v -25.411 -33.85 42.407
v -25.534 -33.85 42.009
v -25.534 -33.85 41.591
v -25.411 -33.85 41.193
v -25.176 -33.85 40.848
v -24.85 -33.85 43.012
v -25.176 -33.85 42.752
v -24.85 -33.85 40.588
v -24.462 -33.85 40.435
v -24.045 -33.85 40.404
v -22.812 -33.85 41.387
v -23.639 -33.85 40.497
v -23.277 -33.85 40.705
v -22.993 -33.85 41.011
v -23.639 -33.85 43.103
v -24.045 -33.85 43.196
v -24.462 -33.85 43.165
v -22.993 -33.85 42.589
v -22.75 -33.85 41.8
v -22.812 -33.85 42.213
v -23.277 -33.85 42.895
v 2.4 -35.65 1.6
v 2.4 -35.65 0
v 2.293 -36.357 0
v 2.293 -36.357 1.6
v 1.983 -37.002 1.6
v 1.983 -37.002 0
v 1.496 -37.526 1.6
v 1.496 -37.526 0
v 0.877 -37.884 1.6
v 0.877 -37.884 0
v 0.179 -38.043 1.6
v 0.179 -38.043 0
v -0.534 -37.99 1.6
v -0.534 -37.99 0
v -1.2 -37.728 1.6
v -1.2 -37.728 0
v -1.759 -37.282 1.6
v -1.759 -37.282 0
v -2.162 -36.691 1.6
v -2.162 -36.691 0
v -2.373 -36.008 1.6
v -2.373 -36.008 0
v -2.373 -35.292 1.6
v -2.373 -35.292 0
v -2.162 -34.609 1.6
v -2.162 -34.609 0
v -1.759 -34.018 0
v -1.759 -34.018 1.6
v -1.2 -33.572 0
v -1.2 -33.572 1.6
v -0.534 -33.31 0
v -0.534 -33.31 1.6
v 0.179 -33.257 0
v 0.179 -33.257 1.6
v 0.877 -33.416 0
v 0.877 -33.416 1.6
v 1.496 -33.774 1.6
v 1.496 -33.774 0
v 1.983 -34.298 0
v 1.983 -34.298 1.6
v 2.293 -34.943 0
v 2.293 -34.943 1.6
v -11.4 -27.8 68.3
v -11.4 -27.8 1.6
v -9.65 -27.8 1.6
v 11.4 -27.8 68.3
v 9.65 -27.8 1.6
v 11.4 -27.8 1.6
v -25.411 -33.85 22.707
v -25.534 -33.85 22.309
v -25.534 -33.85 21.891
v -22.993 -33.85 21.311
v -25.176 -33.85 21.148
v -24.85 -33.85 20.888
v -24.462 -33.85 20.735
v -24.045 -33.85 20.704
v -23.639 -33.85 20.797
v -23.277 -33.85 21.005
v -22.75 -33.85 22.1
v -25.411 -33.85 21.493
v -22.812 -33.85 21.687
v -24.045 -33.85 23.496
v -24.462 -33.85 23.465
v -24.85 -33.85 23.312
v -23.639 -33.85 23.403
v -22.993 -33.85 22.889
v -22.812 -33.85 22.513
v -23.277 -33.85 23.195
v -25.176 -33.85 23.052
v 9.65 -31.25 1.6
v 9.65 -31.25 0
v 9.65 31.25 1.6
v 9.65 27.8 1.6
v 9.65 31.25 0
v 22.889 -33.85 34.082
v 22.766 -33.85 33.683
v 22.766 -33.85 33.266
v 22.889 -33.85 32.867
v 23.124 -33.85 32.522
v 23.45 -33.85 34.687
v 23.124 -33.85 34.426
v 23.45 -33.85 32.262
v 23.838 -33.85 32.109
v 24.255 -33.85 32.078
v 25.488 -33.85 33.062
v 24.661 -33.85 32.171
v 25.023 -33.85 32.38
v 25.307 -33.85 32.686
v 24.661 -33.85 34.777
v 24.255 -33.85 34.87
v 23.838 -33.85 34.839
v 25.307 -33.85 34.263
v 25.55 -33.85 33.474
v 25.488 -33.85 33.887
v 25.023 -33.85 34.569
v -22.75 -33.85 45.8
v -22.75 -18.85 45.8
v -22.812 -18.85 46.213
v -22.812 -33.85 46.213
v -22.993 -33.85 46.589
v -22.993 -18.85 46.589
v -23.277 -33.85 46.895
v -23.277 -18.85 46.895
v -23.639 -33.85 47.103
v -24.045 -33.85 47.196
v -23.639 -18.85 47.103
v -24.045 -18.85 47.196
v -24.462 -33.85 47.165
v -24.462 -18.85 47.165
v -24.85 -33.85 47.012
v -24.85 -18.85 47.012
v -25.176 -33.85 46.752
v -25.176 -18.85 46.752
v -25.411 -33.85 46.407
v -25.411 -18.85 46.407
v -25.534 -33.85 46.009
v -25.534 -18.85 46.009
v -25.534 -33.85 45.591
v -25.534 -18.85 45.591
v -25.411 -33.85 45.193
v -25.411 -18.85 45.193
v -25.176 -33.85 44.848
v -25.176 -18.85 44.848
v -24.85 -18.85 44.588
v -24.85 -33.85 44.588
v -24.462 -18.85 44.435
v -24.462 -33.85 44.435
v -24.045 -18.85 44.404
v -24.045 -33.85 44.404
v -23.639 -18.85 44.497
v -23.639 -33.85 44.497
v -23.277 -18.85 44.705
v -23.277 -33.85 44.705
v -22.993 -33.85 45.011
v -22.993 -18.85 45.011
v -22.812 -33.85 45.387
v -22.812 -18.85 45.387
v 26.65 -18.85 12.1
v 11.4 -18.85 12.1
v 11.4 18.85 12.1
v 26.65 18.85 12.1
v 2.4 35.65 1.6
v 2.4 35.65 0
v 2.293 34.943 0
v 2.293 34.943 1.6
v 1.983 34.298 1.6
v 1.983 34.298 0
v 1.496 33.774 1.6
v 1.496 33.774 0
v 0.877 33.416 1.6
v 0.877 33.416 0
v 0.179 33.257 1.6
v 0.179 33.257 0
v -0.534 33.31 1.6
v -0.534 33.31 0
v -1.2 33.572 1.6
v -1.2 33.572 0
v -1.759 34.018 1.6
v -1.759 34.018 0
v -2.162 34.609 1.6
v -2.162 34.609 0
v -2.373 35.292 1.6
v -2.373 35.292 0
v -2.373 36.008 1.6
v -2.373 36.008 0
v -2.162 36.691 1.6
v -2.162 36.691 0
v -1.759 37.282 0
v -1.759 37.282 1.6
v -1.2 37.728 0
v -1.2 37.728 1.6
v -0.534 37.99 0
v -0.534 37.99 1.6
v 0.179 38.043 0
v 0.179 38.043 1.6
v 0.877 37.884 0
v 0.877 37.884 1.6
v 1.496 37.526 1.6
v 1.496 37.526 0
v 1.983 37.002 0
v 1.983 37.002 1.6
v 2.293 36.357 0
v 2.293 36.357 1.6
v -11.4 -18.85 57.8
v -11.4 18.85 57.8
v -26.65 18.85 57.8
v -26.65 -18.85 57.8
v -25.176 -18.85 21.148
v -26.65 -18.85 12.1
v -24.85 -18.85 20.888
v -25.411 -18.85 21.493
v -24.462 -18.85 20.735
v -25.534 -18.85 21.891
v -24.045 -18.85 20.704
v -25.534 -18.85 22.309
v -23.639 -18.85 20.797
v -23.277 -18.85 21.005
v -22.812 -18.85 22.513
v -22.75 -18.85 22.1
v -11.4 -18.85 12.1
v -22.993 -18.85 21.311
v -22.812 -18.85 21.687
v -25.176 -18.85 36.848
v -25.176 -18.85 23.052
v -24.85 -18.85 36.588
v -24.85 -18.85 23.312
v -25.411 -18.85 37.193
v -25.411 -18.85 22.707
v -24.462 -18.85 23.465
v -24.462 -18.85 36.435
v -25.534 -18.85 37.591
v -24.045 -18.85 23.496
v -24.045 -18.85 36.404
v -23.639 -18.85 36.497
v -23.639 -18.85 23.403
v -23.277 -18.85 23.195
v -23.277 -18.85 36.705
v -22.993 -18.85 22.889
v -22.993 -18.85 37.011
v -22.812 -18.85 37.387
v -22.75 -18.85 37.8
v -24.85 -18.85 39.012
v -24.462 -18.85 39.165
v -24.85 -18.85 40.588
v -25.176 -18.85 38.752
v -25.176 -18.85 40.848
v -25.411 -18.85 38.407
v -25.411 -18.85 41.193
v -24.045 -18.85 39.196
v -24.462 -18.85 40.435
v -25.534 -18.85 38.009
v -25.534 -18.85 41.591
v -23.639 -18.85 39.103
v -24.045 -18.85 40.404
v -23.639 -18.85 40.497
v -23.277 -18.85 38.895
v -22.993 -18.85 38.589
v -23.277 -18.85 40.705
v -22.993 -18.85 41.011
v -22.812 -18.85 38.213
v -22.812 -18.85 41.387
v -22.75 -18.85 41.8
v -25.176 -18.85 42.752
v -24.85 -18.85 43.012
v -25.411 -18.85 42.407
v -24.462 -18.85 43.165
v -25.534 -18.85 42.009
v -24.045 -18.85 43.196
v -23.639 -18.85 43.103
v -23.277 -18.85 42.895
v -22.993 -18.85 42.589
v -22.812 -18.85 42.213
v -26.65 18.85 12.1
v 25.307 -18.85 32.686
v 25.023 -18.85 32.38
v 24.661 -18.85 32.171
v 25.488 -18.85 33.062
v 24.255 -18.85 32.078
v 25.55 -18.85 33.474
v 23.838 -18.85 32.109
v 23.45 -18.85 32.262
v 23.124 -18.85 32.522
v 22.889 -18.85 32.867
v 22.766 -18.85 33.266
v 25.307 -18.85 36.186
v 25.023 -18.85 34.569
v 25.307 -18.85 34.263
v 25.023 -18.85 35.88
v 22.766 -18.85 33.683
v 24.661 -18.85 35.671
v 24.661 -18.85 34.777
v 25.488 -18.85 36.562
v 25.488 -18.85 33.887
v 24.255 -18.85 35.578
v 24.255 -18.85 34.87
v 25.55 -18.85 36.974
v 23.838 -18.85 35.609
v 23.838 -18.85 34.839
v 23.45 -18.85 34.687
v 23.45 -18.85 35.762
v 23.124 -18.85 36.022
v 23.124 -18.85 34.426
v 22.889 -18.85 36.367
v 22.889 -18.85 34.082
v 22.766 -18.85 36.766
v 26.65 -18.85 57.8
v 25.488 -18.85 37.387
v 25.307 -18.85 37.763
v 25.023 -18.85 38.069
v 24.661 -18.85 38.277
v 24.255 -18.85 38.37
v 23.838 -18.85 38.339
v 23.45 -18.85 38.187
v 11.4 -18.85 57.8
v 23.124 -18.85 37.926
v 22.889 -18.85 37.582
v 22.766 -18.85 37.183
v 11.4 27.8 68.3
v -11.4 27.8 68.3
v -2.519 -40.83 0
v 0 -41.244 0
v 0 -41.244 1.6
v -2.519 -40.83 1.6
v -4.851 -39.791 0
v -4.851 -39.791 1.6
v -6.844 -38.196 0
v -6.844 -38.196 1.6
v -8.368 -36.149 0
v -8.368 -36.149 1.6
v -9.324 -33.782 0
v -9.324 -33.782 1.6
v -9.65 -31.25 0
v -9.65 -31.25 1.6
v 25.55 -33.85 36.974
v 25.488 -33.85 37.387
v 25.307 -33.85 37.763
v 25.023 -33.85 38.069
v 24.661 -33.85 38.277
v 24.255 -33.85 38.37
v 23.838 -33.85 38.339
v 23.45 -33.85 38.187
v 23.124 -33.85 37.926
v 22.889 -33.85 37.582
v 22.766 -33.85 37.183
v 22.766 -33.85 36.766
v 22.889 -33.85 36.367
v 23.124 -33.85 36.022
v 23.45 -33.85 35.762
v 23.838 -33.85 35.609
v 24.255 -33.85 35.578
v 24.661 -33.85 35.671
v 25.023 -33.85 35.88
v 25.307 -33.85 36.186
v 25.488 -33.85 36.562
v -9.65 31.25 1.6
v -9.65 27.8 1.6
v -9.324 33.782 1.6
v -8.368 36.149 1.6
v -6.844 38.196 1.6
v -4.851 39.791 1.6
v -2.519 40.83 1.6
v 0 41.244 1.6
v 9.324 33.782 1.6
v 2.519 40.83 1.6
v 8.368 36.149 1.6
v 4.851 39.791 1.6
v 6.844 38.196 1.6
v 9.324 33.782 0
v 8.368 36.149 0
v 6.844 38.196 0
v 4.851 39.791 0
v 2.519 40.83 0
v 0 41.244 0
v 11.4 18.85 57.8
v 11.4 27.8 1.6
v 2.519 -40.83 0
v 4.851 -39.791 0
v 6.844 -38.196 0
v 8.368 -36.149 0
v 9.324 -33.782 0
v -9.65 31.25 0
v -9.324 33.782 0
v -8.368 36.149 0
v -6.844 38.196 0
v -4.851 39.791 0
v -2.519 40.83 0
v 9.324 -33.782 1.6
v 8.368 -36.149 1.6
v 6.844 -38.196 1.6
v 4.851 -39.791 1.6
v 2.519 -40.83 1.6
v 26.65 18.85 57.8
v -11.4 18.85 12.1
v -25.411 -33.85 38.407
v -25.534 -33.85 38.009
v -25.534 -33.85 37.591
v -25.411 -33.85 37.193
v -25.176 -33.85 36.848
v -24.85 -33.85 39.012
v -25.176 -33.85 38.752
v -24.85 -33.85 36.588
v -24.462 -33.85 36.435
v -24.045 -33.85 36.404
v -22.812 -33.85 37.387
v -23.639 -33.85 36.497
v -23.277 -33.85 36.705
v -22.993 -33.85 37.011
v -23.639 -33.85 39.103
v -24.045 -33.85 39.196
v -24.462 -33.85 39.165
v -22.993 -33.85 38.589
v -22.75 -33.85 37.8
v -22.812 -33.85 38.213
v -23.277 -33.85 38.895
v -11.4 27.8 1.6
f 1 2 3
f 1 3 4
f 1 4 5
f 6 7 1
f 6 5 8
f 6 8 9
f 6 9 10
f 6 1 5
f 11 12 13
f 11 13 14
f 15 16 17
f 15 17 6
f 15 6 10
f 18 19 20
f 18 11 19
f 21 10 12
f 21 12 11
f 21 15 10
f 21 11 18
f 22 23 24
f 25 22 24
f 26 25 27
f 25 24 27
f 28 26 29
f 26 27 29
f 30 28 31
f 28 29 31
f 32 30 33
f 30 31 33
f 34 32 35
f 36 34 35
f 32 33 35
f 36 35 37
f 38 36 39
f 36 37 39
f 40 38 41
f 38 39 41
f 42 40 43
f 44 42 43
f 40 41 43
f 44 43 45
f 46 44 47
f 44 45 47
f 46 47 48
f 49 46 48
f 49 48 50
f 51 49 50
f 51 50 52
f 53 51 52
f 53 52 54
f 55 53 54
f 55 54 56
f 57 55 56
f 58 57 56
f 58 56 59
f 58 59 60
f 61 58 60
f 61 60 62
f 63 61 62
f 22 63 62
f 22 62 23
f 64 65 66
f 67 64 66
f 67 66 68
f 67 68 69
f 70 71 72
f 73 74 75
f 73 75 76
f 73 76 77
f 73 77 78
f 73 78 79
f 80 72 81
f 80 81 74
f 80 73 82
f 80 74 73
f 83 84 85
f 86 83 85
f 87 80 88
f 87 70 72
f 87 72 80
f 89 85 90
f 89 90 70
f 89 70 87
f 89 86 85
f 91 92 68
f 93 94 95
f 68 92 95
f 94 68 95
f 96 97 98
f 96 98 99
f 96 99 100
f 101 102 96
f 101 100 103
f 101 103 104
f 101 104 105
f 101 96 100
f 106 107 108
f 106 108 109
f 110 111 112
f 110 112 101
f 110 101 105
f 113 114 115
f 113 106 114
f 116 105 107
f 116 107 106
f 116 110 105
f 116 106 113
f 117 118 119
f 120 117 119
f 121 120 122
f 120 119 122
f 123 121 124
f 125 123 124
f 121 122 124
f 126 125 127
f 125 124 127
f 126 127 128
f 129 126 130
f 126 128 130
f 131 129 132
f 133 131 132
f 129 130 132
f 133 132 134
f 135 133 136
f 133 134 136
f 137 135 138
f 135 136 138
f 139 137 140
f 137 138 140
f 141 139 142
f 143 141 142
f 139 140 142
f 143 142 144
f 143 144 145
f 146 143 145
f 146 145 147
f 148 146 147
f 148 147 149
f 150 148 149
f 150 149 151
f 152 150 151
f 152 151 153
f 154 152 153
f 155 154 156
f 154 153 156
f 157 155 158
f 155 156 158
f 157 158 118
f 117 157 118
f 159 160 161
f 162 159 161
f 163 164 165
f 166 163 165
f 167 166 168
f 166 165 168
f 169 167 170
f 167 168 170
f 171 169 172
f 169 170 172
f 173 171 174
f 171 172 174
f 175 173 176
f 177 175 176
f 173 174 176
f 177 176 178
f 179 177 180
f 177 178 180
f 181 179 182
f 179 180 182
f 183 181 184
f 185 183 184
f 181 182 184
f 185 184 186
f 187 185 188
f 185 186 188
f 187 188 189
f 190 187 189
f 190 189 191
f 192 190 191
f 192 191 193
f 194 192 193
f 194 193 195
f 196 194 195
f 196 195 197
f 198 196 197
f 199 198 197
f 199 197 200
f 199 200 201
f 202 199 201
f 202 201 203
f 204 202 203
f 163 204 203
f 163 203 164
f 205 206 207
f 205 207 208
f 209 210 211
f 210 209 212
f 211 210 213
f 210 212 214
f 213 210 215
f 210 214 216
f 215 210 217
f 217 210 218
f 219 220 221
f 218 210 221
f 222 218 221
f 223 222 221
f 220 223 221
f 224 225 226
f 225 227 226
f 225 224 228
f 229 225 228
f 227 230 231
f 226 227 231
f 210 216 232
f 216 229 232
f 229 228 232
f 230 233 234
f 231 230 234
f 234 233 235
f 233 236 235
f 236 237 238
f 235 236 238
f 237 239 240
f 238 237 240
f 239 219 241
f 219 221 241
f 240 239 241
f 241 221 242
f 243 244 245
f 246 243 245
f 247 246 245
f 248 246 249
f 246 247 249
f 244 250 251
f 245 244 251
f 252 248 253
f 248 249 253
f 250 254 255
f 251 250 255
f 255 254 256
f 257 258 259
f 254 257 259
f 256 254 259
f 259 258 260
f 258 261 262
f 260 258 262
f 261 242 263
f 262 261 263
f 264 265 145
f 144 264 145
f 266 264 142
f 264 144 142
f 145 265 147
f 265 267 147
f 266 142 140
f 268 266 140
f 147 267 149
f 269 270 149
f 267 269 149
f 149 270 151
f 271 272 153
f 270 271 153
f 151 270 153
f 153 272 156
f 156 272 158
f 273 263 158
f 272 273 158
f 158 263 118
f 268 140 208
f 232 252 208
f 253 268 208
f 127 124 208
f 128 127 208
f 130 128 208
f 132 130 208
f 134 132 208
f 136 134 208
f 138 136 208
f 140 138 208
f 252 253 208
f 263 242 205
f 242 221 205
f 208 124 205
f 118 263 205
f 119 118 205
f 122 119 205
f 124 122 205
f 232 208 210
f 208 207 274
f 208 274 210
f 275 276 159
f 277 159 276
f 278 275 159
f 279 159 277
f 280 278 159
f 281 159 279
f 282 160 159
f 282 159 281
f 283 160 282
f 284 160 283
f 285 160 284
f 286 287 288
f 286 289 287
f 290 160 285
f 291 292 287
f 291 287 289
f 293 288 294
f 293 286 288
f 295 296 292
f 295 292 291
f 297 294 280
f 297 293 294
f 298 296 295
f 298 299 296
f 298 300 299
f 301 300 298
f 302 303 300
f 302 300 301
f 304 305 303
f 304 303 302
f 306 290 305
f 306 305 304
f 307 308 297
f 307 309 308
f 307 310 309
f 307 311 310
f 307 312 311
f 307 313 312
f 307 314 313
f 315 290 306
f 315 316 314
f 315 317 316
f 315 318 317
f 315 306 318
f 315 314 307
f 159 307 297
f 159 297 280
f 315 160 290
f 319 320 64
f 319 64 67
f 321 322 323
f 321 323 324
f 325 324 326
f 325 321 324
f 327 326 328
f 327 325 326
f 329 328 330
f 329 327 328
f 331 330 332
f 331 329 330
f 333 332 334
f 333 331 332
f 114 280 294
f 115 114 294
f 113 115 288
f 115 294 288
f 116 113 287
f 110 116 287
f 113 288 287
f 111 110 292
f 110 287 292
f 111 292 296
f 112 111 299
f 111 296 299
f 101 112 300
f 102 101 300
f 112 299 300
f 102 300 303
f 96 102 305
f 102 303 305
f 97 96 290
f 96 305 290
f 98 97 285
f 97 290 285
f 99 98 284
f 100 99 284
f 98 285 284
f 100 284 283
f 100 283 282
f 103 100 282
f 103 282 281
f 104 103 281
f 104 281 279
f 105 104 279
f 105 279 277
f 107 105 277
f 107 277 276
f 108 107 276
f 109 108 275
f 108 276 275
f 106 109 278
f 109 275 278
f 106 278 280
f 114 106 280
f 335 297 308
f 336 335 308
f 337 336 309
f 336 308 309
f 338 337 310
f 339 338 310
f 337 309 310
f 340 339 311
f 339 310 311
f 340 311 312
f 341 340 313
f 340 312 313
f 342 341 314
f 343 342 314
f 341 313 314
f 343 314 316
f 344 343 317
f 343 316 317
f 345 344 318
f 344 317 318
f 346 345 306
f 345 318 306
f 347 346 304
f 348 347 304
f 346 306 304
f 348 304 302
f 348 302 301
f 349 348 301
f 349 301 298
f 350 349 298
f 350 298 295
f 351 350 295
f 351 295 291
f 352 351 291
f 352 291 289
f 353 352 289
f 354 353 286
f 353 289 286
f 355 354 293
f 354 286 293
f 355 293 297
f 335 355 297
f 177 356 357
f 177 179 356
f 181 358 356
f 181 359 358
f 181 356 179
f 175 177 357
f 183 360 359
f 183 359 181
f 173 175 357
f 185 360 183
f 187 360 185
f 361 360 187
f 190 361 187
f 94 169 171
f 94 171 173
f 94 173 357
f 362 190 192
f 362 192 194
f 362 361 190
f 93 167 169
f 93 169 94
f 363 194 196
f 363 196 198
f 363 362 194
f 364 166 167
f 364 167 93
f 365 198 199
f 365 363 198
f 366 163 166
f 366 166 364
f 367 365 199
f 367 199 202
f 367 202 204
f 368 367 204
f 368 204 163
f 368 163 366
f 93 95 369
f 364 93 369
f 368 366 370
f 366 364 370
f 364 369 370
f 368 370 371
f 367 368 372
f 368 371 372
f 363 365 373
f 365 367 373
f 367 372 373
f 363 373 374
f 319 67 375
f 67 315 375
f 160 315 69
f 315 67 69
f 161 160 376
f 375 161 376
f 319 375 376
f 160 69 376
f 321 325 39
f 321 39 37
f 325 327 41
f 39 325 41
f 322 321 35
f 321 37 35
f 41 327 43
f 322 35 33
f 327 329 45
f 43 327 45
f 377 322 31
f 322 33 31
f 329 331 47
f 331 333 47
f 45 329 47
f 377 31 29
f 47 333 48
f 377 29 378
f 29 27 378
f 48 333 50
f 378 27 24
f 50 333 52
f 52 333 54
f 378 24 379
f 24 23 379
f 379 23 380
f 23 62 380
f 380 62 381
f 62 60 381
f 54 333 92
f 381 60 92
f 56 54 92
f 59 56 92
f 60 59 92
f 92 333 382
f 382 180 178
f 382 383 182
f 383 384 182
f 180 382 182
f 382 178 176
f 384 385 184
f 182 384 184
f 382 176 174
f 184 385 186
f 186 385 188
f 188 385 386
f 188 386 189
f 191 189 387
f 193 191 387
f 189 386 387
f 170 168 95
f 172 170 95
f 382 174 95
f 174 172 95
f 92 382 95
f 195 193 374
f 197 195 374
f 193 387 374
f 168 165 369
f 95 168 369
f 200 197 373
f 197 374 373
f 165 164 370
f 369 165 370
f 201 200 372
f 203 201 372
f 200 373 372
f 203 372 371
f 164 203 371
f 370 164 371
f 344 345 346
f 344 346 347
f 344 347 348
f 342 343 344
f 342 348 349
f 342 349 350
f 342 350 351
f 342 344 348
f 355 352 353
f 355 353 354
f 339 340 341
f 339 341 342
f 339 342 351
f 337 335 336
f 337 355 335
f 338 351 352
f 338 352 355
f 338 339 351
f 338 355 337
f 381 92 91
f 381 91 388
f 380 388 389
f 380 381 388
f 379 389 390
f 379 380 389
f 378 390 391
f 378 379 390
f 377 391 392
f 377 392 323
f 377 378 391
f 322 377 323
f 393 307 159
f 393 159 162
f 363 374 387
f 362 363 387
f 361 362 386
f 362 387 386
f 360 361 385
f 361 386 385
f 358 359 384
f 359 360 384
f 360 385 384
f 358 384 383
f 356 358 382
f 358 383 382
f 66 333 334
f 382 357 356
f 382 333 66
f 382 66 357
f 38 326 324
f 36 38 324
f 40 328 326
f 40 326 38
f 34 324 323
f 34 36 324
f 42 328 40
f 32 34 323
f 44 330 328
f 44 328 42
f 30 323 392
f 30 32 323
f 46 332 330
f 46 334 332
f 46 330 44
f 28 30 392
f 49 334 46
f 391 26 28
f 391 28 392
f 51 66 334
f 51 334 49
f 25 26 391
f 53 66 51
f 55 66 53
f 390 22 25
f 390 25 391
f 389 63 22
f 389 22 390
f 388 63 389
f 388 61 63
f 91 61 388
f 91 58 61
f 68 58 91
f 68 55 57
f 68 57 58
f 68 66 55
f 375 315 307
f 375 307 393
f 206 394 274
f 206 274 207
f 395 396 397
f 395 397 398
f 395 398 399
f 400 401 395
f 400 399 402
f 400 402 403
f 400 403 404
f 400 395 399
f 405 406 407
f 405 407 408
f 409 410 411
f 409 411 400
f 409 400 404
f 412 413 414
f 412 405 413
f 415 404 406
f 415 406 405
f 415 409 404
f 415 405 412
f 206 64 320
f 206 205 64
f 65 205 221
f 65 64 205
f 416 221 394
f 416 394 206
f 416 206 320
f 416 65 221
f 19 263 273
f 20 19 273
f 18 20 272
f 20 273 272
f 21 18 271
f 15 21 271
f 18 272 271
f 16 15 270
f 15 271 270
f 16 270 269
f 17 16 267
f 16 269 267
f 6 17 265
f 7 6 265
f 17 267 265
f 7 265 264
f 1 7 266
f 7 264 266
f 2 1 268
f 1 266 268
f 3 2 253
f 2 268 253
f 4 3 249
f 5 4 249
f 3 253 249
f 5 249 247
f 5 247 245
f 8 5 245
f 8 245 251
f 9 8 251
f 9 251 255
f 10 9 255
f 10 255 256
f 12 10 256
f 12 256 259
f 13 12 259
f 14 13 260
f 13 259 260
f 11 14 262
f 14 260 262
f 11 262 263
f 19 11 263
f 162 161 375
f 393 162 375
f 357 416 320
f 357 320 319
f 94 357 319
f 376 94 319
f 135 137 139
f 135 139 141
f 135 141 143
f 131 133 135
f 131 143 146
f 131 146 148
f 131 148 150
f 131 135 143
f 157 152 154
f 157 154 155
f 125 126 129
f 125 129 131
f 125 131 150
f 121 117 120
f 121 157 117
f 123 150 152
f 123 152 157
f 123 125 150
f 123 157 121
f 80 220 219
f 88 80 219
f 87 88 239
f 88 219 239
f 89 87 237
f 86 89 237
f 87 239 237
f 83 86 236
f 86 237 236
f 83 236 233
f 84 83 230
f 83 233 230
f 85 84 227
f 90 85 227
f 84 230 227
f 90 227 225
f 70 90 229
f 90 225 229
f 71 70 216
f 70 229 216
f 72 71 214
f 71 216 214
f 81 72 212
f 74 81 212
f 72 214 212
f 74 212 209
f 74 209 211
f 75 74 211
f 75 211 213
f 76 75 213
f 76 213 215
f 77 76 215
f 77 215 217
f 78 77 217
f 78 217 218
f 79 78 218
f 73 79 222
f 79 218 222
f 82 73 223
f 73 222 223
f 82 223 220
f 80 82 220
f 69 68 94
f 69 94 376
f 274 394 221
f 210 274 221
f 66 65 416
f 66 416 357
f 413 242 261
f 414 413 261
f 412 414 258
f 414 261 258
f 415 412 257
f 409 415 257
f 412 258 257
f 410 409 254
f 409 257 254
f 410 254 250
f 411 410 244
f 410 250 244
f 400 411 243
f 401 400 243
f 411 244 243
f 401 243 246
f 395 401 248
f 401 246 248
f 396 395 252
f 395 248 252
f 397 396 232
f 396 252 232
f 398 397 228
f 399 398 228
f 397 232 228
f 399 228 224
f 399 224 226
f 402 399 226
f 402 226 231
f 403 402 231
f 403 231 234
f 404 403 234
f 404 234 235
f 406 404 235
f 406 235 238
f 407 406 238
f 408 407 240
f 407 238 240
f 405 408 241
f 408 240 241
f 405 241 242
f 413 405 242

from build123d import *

# Parameters (mm, degrees)
F0_W         = 19.3
F0_H         = 82.5
F1_DEPTH     = 1.6
F2_W         = 22.8
F2_H         = 55.6
F3_DEPTH     = 66.7
F4_W         = 37.7
F4_H         = 45.7
F5_DEPTH     = 15.25
F6_W         = 37.7
F6_H         = 45.7
F7_DEPTH     = 15.25
F8_R         = 2.4
F9_DEPTH     = 68.301
F10_T1_DEPTH = 51.6
F11_R        = 1.4
F12_DEPTH    = 15
F13_R        = 1.4
F14_DEPTH    = 15


# Not quite as in the source:
# - a fillet or chamfer that OpenCascade refuses, or shapes differently, is made with other operations: its cross-section is extruded or revolved along the edge and cut away or added


with BuildPart() as f1:
    # F0 (on Top) → F1 (new body)
    with BuildSketch(Plane.XY):
        Rectangle(F0_W, F0_H)
    extrude(amount=F1_DEPTH)

    # F2 (on face) → F3 (join)
    with BuildSketch(Plane.XY.offset(1.6)):
        Rectangle(F2_W, F2_H)
    extrude(amount=F3_DEPTH)

    # F4 (on face) → F5 (join)
    with BuildSketch(Plane(origin=(-11.4, 0, 0), x_dir=(0, -1, 0), z_dir=(-1, 0, 0))):
        with Locations((0, 34.95)):
            Rectangle(F4_W, F4_H)
    extrude(amount=F5_DEPTH)

    # F6 (on face) → F7 (join)
    with BuildSketch(Plane.YZ.offset(11.4)):
        with Locations((0, 34.95)):
            Rectangle(F6_W, F6_H)
    extrude(amount=F7_DEPTH)

    # F8 (on face) → F9 (cut, through all)
    with BuildSketch(Plane(origin=(0, 0, 0), x_dir=(1, 0, 0), z_dir=(0, 0, -1))):
        with Locations((0, 35.65)):
            Circle(F8_R)
        with Locations((0, -35.65)):
            Circle(F8_R)
    extrude(amount=-F9_DEPTH, mode=Mode.SUBTRACT)

    # F10: fillet of radius 10 on 4 edges, made by hand

    # F10_s2 → F10_t1 (cut)
    with BuildSketch(Plane.XY.offset(-25)):
        with BuildLine():
            ThreePointArc((0.35, 41.25), (-6.7210678119, 38.3210678119), (-9.65, 31.25))
            Line((-9.65, 31.25), (-9.65, 41.25))
            Line((-9.65, 41.25), (0.35, 41.25))
        make_face()
        with BuildLine():
            ThreePointArc((9.65, 31.25), (6.7210678119, 38.3210678119), (-0.35, 41.25))
            Line((-0.35, 41.25), (9.65, 41.25))
            Line((9.65, 41.25), (9.65, 31.25))
        make_face()
        with BuildLine():
            ThreePointArc((9.65, -31.25), (6.7210678119, -38.3210678119), (-0.35, -41.25))
            Line((-0.35, -41.25), (9.65, -41.25))
            Line((9.65, -41.25), (9.65, -31.25))
        make_face()
        with BuildLine():
            ThreePointArc((0.35, -41.25), (-6.7210678119, -38.3210678119), (-9.65, -31.25))
            Line((-9.65, -31.25), (-9.65, -41.25))
            Line((-9.65, -41.25), (0.35, -41.25))
        make_face()
    extrude(amount=F10_T1_DEPTH, mode=Mode.SUBTRACT)

    # F11 (on face) → F12 (join)
    with BuildSketch(Plane.XZ.offset(18.85)):
        with Locations((-24.15, 41.8)):
            Circle(F11_R)
        with Locations((-24.15, 45.8)):
            Circle(F11_R)
        with Locations((-24.15, 37.8)):
            Circle(F11_R)
        with Locations((-24.15, 22.1)):
            Circle(F11_R)
    extrude(amount=F12_DEPTH)

    # F13 (on face) → F14 (join)
    with BuildSketch(Plane.XZ.offset(18.85)):
        with Locations((24.15, 36.9742031991)):
            Circle(F13_R)
        with Locations((24.15, 33.4742031991)):
            Circle(F13_R)
    extrude(amount=F14_DEPTH)


solid = f1.part
